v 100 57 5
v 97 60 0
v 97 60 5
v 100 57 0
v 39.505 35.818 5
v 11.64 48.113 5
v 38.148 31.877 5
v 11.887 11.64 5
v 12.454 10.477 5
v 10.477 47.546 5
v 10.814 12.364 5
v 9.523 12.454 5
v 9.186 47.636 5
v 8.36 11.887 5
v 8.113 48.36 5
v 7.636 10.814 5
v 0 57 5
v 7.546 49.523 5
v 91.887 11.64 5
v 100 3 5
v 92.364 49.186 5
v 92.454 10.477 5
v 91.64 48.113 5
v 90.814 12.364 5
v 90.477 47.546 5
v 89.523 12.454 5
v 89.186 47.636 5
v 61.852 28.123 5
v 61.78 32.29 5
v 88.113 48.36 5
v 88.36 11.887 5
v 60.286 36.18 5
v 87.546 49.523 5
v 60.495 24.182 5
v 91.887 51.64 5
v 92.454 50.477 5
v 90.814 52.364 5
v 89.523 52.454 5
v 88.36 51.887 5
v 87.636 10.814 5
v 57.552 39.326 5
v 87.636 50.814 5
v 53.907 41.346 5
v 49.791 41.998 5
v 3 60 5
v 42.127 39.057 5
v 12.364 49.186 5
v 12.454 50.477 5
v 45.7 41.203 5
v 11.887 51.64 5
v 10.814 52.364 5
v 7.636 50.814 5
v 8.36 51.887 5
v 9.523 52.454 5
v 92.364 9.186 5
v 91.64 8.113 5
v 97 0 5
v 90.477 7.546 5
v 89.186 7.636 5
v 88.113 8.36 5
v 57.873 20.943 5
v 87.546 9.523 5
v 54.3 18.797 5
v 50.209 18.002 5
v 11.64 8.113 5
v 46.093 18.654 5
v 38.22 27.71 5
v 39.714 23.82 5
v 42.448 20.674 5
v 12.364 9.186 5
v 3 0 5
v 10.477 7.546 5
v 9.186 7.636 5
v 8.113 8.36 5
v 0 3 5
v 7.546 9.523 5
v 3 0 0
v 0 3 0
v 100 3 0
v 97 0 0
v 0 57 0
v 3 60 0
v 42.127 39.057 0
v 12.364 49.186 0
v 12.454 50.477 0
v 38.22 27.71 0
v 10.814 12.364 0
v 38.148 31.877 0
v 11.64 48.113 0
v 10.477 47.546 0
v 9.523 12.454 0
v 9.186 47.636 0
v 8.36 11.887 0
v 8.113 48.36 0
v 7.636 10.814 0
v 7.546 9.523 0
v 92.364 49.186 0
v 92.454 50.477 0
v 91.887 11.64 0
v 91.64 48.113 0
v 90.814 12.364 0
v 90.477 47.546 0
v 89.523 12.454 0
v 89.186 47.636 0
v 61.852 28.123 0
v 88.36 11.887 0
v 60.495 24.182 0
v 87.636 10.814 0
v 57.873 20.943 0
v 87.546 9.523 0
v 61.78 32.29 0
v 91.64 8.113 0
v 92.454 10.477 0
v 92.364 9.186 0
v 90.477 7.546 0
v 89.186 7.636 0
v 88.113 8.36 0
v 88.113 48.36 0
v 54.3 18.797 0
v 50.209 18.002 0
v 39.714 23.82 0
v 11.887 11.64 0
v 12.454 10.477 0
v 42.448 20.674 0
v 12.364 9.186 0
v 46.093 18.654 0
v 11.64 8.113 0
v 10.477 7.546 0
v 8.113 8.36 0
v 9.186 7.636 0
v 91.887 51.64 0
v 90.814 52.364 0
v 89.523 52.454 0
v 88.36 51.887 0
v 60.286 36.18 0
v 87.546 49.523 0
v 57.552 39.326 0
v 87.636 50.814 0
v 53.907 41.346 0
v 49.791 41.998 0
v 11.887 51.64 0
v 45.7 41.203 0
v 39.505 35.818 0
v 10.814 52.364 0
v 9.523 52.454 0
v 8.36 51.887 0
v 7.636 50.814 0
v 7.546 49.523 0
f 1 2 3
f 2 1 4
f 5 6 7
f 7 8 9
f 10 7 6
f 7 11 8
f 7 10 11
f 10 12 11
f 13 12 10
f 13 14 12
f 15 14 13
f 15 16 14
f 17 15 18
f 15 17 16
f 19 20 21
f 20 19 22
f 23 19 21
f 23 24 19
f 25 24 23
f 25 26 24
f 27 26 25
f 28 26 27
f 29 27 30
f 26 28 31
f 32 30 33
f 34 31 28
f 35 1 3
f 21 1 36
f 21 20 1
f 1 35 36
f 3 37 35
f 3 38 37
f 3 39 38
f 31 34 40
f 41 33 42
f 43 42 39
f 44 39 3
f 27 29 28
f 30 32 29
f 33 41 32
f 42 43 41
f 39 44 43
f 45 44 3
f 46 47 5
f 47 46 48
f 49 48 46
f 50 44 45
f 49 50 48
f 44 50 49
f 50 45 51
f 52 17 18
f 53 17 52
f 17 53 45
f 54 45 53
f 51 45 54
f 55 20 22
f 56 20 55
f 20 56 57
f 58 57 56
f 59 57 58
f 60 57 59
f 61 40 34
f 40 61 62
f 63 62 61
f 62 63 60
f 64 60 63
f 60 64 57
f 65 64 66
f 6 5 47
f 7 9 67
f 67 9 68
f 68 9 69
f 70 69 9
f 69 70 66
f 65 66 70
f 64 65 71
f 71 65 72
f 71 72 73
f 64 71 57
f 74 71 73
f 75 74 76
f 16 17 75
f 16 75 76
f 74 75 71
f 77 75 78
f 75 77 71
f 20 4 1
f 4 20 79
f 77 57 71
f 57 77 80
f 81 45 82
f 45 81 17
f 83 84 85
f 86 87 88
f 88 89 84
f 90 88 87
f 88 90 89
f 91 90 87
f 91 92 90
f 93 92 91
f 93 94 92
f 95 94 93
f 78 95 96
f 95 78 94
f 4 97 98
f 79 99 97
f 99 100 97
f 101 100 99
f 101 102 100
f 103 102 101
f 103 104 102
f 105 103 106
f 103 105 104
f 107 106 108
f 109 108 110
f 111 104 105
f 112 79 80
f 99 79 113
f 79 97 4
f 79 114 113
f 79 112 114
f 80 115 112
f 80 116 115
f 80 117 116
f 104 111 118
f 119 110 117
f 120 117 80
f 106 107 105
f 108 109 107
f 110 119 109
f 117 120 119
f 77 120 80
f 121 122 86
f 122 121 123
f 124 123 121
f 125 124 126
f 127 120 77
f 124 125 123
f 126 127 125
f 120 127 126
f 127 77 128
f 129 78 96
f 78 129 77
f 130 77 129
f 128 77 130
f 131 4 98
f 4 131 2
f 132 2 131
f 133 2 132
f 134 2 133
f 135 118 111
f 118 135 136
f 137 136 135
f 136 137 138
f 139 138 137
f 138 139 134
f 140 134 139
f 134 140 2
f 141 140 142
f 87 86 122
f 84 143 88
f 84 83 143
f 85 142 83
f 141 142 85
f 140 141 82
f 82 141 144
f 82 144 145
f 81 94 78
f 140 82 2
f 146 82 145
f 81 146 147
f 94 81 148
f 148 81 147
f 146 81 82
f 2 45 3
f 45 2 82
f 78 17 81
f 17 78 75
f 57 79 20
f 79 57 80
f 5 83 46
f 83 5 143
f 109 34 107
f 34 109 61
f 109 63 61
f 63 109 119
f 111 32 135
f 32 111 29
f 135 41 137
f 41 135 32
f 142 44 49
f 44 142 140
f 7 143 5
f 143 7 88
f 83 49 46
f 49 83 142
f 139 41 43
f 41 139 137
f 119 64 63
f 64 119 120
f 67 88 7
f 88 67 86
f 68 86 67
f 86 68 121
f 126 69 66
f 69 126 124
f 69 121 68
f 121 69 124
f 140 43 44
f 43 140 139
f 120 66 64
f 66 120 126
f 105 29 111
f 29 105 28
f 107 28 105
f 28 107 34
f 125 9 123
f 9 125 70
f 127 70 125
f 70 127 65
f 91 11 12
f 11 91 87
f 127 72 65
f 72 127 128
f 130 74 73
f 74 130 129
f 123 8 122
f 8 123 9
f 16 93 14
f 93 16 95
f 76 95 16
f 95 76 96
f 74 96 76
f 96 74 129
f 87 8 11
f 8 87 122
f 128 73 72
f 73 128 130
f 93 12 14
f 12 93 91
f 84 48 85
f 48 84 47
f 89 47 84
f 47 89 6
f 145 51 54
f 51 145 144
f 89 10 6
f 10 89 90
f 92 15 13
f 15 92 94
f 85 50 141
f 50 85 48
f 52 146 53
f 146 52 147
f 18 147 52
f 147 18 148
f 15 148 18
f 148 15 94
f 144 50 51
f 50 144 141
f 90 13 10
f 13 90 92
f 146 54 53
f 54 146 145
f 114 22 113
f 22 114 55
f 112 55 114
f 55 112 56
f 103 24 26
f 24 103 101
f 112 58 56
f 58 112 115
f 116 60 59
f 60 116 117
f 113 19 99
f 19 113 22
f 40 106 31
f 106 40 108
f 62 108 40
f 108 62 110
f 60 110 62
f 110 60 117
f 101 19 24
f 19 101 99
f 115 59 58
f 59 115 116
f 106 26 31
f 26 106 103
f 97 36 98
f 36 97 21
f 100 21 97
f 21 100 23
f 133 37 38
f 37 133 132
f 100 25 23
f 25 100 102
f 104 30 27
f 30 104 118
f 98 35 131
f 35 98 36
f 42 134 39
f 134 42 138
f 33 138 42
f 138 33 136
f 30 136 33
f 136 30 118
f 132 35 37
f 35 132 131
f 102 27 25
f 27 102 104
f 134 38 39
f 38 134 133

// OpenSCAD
$fn = 32;

// ----------------------------------------------------------------------
// Spacer plate: rect 100 x 60
// ----------------------------------------------------------------------

// --- parameters (mm) ---
bore_r = 12;              // centre bore radius
bolt_r = 2.5;             // bolt hole radius
plate_t = 5;              // plate thickness, Z (extrusion height)
plate_l = 100;            // plate length, X
plate_w = 60;             // plate width, Y
inset = 10;               // corner hole inset

profile = [[3, 0], [97, 0], [100, 3], [100, 57], [97, 60], [3, 60], [0, 57], [0, 3]];  // primary outline, 8 points, counter clockwise
void_1 = [[61.78, 32.29], [60.286, 36.18], [57.552, 39.326], [53.907, 41.346], [49.791, 41.998], [45.7, 41.203], [42.127, 39.057], [39.505, 35.818], [38.148, 31.877], [38.22, 27.71], [39.714, 23.82], [42.448, 20.674], [46.093, 18.654], [50.209, 18.002], [54.3, 18.797], [57.873, 20.943], [60.495, 24.182], [61.852, 28.123]];  // centre bore, 18 points
void_2 = [[12.454, 10.477], [11.887, 11.64], [10.814, 12.364], [9.523, 12.454], [8.36, 11.887], [7.636, 10.814], [7.546, 9.523], [8.113, 8.36], [9.186, 7.636], [10.477, 7.546], [11.64, 8.113], [12.364, 9.186]];  // corner hole, 12 points
void_3 = [[12.454, 50.477], [11.887, 51.64], [10.814, 52.364], [9.523, 52.454], [8.36, 51.887], [7.636, 50.814], [7.546, 49.523], [8.113, 48.36], [9.186, 47.636], [10.477, 47.546], [11.64, 48.113], [12.364, 49.186]];  // corner hole, 12 points
void_4 = [[92.454, 10.477], [91.887, 11.64], [90.814, 12.364], [89.523, 12.454], [88.36, 11.887], [87.636, 10.814], [87.546, 9.523], [88.113, 8.36], [89.186, 7.636], [90.477, 7.546], [91.64, 8.113], [92.364, 9.186]];  // corner hole, 12 points
void_5 = [[92.454, 50.477], [91.887, 51.64], [90.814, 52.364], [89.523, 52.454], [88.36, 51.887], [87.636, 50.814], [87.546, 49.523], [88.113, 48.36], [89.186, 47.636], [90.477, 47.546], [91.64, 48.113], [92.364, 49.186]];  // corner hole, 12 points

// --- the one profile operation ---
difference() {
  linear_extrude(height = plate_t) polygon(points = profile);
  translate([0, 0, -1])
    linear_extrude(height = plate_t + 2) polygon(points = void_1);
  translate([0, 0, -1])
    linear_extrude(height = plate_t + 2) polygon(points = void_2);
  translate([0, 0, -1])
    linear_extrude(height = plate_t + 2) polygon(points = void_3);
  translate([0, 0, -1])
    linear_extrude(height = plate_t + 2) polygon(points = void_4);
  translate([0, 0, -1])
    linear_extrude(height = plate_t + 2) polygon(points = void_5);
}
